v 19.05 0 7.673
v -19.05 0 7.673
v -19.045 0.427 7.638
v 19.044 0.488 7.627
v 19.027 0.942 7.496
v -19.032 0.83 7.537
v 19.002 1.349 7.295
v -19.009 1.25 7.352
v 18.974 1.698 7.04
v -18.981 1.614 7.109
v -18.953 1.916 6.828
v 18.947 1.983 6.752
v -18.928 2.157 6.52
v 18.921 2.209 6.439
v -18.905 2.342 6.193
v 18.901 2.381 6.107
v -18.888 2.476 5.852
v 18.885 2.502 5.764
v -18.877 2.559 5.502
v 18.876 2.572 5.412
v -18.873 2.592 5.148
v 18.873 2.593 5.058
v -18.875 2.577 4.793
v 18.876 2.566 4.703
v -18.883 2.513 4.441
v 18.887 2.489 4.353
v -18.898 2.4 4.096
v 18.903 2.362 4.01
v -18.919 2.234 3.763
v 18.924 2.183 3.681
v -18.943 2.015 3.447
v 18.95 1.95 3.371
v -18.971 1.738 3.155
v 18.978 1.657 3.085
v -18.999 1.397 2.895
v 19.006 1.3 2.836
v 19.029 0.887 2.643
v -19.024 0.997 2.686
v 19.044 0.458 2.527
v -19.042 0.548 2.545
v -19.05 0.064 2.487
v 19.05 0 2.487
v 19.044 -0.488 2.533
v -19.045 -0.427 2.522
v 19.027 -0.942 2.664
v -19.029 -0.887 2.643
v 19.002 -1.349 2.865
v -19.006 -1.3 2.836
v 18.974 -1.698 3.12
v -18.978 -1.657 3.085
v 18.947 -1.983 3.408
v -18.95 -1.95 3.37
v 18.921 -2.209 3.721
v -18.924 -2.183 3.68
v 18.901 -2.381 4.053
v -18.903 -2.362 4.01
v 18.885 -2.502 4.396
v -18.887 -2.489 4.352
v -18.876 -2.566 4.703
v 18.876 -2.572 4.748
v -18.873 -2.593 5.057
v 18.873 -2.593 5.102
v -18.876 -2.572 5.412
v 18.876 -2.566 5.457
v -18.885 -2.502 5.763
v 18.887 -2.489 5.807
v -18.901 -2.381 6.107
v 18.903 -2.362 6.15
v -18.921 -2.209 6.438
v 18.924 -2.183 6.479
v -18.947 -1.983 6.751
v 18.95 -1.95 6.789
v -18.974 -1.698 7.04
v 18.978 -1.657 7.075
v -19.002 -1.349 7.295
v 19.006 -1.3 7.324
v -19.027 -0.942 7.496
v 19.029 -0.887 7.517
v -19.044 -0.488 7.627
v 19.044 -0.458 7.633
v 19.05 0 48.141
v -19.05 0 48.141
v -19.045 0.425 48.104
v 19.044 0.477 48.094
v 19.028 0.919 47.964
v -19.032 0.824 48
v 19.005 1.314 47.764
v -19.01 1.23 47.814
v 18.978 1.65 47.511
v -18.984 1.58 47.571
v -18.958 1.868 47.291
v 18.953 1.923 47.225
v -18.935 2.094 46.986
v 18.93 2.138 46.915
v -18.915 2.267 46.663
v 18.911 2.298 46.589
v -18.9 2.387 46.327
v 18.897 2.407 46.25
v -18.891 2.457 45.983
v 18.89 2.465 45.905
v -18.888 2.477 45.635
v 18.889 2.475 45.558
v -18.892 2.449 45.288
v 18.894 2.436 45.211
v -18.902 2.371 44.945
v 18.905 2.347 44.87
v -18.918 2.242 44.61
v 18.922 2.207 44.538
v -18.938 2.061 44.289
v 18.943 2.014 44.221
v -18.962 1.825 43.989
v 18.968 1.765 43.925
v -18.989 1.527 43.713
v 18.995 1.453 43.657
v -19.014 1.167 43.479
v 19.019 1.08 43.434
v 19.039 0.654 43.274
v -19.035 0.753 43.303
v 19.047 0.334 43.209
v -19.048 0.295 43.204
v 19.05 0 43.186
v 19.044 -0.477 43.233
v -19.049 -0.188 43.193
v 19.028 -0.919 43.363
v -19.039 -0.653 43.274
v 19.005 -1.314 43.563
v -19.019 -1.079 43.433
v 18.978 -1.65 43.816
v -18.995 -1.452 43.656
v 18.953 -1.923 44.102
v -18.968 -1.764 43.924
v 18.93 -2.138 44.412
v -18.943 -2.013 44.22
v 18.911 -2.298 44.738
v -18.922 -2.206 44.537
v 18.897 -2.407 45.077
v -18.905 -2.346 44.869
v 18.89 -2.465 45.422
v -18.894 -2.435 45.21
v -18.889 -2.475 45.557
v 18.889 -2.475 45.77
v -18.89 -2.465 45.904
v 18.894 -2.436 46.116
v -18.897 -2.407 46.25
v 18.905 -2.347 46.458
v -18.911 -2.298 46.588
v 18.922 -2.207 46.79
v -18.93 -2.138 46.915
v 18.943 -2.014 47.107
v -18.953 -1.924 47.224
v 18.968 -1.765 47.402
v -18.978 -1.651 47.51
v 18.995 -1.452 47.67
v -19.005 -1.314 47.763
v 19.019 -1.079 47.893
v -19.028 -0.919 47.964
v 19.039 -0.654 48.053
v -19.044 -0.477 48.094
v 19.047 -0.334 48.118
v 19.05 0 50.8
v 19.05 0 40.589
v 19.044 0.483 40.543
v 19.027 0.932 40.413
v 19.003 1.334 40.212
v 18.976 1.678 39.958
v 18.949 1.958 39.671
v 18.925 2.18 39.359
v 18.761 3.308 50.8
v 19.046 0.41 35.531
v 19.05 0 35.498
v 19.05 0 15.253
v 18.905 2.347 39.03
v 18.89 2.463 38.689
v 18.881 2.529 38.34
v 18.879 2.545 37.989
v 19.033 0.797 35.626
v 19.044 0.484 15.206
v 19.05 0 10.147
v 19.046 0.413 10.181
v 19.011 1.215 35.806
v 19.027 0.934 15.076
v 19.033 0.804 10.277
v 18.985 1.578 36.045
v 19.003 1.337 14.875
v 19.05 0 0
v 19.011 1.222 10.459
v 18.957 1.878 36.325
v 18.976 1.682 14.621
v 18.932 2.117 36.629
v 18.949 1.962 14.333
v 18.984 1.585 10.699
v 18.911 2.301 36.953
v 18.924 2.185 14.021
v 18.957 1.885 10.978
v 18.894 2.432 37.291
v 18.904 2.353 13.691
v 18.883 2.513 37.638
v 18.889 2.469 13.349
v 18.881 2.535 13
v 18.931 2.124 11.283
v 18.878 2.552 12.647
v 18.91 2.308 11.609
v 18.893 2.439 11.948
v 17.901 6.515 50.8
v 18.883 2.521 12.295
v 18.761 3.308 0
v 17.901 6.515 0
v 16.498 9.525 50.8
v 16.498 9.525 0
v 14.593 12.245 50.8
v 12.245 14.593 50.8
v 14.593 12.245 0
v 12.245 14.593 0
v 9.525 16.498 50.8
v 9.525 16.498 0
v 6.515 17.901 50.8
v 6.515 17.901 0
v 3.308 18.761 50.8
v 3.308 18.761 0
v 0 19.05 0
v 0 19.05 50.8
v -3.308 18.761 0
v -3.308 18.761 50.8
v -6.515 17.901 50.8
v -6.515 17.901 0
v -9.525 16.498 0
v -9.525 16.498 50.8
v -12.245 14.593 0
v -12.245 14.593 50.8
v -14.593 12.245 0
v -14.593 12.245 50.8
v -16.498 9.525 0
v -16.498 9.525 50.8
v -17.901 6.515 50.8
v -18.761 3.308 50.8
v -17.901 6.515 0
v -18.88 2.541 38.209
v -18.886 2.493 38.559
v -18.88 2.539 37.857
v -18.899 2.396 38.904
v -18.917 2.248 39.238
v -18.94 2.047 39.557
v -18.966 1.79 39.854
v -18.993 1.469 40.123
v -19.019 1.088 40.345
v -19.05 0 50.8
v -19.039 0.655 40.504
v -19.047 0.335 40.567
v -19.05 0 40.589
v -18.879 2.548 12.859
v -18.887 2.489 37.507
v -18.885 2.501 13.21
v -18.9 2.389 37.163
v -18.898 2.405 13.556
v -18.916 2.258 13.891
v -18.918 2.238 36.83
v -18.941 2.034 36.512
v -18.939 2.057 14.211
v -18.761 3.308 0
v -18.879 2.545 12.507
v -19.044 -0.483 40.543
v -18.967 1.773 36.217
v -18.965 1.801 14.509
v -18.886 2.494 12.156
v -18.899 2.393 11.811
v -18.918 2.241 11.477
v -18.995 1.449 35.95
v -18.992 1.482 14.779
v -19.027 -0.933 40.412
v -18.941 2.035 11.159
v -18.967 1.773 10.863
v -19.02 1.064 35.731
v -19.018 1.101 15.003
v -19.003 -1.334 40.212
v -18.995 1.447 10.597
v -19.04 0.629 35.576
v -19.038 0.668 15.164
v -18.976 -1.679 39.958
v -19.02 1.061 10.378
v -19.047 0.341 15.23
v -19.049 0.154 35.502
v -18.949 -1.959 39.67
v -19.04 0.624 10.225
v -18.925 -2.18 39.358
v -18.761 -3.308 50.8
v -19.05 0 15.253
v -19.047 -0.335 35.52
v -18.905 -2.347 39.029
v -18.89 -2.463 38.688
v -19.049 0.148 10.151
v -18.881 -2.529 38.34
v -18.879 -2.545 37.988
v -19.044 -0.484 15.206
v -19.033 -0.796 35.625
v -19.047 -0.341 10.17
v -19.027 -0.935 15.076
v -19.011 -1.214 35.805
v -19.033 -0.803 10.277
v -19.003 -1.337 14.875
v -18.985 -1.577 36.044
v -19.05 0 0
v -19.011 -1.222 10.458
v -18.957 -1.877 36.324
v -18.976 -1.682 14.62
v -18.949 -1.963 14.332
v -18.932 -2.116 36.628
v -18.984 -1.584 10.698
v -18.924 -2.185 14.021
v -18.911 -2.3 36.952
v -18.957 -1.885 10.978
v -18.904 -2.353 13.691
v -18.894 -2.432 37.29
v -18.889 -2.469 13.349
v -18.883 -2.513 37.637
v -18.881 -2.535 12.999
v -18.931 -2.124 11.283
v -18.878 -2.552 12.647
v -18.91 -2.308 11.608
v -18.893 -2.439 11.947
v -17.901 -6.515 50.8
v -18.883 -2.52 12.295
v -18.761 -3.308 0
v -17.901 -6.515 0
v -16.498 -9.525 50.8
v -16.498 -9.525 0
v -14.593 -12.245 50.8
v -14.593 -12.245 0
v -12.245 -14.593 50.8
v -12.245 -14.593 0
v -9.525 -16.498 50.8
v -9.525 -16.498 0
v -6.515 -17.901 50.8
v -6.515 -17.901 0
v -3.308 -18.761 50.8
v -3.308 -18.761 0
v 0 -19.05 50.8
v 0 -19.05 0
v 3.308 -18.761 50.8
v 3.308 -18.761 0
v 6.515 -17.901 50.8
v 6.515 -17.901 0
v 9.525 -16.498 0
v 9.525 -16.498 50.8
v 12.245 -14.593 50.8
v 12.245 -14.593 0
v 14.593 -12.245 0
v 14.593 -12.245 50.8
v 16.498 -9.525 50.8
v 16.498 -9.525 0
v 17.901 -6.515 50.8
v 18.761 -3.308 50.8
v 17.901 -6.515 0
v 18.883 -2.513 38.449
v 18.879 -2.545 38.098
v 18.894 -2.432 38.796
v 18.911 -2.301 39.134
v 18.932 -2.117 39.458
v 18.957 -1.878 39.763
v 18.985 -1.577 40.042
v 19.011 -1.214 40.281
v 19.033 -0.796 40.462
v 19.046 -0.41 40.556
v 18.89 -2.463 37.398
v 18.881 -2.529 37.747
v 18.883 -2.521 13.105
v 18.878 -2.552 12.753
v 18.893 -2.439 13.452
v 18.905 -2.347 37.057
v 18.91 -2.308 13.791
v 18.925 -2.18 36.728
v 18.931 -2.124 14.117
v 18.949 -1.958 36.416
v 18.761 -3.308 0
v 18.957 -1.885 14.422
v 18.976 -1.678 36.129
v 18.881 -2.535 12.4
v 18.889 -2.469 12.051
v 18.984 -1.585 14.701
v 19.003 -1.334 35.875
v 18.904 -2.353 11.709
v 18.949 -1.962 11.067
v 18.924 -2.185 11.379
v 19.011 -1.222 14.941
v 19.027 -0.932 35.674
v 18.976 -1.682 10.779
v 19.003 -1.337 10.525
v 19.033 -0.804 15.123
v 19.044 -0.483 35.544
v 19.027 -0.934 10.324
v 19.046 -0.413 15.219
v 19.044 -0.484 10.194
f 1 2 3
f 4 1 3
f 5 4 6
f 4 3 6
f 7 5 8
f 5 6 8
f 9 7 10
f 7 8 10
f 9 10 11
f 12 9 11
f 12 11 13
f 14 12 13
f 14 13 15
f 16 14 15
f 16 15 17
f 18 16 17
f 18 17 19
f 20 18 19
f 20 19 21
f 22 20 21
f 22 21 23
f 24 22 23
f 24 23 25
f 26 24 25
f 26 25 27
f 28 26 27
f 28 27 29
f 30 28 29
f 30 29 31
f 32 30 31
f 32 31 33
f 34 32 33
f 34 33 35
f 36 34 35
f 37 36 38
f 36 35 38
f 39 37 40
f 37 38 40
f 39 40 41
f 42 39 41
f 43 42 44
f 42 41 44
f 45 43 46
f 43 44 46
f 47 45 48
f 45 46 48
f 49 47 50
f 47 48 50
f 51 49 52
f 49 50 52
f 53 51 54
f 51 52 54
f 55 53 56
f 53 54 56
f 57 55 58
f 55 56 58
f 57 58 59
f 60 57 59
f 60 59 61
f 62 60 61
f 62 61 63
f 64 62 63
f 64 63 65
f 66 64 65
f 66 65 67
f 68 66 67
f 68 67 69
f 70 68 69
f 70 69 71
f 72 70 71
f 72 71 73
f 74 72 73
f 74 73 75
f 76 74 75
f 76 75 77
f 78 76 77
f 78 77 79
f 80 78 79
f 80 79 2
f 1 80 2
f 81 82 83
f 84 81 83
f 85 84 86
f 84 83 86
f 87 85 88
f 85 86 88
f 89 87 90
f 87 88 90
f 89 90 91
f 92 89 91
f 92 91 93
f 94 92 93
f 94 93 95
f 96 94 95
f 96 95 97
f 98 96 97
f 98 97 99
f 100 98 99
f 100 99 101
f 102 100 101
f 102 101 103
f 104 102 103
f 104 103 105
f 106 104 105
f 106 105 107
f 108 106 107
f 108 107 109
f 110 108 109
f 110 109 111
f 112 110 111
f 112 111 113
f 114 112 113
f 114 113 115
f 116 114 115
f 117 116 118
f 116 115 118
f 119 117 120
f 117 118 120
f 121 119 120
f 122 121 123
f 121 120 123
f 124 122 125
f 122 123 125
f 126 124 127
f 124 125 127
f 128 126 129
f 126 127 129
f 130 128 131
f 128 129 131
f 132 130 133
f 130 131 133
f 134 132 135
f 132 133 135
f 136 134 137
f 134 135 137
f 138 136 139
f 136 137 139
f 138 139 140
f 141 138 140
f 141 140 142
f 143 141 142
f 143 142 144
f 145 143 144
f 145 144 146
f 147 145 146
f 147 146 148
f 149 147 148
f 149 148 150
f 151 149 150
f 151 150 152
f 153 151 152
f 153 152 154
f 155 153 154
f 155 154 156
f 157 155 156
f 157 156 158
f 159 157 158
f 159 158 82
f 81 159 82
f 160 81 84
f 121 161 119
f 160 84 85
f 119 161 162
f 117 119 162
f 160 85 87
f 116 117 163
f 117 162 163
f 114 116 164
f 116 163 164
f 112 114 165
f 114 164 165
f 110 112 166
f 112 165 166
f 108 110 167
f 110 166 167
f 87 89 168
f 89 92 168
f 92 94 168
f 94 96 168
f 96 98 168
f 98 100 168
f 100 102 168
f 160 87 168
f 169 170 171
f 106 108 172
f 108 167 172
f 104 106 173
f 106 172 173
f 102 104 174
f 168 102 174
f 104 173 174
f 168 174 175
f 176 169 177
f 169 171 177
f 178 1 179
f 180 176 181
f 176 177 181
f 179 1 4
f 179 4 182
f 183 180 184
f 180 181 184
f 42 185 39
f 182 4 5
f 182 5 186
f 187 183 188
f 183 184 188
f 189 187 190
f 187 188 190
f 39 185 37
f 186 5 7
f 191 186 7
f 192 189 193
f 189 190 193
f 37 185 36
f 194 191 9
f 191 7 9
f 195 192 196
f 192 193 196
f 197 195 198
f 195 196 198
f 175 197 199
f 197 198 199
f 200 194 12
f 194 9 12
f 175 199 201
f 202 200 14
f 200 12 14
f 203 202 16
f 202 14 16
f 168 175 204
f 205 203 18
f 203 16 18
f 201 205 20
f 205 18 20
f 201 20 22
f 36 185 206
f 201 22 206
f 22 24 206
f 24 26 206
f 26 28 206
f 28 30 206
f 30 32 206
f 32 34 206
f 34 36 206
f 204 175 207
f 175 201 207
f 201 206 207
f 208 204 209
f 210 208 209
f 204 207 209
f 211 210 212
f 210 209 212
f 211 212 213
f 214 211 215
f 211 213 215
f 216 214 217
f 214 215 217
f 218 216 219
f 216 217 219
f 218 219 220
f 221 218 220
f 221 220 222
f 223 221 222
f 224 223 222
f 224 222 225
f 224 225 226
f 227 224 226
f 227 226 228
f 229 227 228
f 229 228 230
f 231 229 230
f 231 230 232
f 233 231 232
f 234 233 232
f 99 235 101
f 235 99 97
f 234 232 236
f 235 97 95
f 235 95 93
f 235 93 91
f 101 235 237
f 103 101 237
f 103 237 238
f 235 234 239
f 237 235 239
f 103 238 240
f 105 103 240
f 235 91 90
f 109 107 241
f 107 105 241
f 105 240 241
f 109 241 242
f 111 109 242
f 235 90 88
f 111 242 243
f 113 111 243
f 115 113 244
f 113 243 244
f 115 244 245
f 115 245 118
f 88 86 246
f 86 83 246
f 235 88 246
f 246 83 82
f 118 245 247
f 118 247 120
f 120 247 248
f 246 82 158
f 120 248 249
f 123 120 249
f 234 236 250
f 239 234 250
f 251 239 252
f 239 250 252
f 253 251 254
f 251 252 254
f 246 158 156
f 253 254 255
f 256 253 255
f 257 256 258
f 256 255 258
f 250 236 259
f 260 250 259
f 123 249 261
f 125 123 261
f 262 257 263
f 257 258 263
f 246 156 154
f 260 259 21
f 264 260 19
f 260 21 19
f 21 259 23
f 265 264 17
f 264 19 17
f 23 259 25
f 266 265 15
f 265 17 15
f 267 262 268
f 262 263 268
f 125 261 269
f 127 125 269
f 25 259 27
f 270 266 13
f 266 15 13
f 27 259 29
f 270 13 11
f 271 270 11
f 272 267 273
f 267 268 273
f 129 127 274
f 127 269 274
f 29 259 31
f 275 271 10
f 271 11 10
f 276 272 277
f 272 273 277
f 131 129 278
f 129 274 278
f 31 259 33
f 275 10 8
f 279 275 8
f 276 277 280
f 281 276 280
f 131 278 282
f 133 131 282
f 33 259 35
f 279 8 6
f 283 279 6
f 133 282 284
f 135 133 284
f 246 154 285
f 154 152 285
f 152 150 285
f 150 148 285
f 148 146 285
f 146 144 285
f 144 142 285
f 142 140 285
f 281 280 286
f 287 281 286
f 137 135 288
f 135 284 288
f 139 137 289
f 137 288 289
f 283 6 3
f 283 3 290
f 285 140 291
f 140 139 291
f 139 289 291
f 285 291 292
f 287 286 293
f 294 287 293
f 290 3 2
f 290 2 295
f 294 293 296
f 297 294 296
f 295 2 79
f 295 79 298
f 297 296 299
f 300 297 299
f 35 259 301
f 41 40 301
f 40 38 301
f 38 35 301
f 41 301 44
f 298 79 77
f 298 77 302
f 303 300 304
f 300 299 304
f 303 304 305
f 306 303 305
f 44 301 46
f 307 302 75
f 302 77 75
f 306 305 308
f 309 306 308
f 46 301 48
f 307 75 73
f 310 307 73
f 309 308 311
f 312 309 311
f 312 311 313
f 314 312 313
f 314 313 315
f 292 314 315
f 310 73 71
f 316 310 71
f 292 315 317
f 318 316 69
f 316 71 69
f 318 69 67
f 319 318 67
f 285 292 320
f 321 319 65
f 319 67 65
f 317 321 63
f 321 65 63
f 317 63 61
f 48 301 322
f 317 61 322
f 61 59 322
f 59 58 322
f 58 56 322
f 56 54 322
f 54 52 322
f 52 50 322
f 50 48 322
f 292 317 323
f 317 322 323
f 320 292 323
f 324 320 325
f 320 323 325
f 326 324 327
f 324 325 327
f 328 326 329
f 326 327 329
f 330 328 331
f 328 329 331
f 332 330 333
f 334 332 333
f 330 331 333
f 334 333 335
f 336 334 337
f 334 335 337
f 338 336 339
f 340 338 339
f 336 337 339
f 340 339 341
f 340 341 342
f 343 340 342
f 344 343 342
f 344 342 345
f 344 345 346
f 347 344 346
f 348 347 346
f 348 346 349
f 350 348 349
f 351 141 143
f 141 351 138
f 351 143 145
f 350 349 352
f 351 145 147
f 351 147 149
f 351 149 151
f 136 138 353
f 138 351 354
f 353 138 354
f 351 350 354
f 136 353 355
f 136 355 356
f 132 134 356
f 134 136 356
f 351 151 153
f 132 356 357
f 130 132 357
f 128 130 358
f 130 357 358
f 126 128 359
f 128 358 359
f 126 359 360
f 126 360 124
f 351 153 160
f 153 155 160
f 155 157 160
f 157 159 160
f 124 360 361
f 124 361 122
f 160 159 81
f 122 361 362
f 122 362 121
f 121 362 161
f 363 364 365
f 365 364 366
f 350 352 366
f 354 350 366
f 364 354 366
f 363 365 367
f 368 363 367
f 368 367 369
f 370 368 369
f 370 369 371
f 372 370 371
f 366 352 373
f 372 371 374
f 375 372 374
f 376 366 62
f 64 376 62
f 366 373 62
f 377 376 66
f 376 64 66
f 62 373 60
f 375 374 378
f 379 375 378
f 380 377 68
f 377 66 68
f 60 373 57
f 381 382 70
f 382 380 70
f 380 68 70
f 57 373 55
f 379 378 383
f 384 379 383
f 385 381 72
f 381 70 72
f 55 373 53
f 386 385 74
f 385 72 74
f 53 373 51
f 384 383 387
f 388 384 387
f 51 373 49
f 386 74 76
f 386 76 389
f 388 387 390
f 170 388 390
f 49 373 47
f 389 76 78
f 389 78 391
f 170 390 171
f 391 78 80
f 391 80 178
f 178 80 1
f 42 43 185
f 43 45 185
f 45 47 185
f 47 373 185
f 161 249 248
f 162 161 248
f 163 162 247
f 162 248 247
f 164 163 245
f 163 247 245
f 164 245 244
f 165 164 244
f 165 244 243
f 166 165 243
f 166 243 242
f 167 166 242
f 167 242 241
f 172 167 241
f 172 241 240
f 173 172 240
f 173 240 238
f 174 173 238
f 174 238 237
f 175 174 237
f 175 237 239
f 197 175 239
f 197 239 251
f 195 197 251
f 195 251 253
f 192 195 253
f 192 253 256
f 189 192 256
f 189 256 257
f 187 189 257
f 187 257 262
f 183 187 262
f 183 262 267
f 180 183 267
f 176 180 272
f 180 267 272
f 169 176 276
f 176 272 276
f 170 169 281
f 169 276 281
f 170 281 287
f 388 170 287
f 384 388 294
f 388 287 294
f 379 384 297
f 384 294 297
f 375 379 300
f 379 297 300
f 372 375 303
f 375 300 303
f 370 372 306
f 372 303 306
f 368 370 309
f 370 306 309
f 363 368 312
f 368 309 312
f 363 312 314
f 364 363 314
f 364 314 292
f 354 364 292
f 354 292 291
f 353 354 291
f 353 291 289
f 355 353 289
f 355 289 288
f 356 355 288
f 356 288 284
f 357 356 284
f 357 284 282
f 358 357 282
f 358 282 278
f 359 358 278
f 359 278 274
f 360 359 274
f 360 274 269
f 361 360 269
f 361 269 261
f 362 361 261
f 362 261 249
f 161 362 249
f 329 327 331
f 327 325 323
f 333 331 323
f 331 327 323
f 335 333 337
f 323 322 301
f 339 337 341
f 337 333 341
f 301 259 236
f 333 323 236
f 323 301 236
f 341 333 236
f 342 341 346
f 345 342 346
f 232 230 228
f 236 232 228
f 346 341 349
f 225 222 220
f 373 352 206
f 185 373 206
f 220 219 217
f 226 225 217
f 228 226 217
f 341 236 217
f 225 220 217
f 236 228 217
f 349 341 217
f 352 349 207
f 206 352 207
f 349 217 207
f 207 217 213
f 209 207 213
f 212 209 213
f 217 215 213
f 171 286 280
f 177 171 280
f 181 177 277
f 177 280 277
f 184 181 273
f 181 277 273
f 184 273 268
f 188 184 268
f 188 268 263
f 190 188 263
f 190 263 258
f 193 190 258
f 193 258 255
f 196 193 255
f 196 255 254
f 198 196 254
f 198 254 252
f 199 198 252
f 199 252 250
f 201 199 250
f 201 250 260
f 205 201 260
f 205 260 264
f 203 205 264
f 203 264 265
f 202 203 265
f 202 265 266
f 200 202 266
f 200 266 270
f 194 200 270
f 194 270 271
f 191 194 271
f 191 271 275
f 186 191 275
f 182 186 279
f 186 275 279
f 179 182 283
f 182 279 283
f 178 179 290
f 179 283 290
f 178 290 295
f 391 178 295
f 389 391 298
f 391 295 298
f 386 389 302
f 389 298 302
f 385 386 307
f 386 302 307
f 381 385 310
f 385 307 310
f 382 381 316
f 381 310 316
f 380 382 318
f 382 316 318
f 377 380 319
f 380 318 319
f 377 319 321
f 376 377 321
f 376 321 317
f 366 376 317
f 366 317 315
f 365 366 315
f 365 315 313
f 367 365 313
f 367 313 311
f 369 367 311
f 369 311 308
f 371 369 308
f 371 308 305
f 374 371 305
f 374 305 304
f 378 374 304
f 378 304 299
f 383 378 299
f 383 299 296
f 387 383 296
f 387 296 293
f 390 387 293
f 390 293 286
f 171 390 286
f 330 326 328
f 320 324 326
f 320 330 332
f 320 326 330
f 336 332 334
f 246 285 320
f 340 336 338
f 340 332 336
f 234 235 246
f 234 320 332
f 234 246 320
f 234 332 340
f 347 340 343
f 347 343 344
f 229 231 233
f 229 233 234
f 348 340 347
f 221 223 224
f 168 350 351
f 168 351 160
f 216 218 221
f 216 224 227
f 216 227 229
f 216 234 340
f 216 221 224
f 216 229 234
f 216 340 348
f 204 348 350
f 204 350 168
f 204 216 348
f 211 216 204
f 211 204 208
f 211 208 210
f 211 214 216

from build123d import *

# Parameters (mm, degrees)
SKETCH2_R           = 19.05
BOSS_EXTRUDE1_DEPTH = 50.8
SKETCH3_R           = 2.593311049
SKETCH3_R_2         = 2.552831608
SKETCH3_R_3         = 2.477244579
SKETCH3_R_4         = 2.54595384
CUT_EXTRUDE1_DEPTH  = 67.295946332


with BuildPart() as part:
    # Sketch2 → Boss-Extrude1 (new body)
    with BuildSketch(Plane.XY):
        Circle(SKETCH2_R)
    extrude(amount=BOSS_EXTRUDE1_DEPTH)

    # Sketch3 → Cut-Extrude1 (cut, through all)
    with BuildSketch(Plane.ZY.offset(19.05)):
        with Locations((5.08, 0)):
            Circle(SKETCH3_R)
        with Locations((12.7, 0)):
            Circle(SKETCH3_R_2)
        with Locations((45.663499475, 0)):
            Circle(SKETCH3_R_3)
        with Locations((38.043499475, 0)):
            Circle(SKETCH3_R_4)
    extrude(amount=-CUT_EXTRUDE1_DEPTH, mode=Mode.SUBTRACT)


solid = part.part
